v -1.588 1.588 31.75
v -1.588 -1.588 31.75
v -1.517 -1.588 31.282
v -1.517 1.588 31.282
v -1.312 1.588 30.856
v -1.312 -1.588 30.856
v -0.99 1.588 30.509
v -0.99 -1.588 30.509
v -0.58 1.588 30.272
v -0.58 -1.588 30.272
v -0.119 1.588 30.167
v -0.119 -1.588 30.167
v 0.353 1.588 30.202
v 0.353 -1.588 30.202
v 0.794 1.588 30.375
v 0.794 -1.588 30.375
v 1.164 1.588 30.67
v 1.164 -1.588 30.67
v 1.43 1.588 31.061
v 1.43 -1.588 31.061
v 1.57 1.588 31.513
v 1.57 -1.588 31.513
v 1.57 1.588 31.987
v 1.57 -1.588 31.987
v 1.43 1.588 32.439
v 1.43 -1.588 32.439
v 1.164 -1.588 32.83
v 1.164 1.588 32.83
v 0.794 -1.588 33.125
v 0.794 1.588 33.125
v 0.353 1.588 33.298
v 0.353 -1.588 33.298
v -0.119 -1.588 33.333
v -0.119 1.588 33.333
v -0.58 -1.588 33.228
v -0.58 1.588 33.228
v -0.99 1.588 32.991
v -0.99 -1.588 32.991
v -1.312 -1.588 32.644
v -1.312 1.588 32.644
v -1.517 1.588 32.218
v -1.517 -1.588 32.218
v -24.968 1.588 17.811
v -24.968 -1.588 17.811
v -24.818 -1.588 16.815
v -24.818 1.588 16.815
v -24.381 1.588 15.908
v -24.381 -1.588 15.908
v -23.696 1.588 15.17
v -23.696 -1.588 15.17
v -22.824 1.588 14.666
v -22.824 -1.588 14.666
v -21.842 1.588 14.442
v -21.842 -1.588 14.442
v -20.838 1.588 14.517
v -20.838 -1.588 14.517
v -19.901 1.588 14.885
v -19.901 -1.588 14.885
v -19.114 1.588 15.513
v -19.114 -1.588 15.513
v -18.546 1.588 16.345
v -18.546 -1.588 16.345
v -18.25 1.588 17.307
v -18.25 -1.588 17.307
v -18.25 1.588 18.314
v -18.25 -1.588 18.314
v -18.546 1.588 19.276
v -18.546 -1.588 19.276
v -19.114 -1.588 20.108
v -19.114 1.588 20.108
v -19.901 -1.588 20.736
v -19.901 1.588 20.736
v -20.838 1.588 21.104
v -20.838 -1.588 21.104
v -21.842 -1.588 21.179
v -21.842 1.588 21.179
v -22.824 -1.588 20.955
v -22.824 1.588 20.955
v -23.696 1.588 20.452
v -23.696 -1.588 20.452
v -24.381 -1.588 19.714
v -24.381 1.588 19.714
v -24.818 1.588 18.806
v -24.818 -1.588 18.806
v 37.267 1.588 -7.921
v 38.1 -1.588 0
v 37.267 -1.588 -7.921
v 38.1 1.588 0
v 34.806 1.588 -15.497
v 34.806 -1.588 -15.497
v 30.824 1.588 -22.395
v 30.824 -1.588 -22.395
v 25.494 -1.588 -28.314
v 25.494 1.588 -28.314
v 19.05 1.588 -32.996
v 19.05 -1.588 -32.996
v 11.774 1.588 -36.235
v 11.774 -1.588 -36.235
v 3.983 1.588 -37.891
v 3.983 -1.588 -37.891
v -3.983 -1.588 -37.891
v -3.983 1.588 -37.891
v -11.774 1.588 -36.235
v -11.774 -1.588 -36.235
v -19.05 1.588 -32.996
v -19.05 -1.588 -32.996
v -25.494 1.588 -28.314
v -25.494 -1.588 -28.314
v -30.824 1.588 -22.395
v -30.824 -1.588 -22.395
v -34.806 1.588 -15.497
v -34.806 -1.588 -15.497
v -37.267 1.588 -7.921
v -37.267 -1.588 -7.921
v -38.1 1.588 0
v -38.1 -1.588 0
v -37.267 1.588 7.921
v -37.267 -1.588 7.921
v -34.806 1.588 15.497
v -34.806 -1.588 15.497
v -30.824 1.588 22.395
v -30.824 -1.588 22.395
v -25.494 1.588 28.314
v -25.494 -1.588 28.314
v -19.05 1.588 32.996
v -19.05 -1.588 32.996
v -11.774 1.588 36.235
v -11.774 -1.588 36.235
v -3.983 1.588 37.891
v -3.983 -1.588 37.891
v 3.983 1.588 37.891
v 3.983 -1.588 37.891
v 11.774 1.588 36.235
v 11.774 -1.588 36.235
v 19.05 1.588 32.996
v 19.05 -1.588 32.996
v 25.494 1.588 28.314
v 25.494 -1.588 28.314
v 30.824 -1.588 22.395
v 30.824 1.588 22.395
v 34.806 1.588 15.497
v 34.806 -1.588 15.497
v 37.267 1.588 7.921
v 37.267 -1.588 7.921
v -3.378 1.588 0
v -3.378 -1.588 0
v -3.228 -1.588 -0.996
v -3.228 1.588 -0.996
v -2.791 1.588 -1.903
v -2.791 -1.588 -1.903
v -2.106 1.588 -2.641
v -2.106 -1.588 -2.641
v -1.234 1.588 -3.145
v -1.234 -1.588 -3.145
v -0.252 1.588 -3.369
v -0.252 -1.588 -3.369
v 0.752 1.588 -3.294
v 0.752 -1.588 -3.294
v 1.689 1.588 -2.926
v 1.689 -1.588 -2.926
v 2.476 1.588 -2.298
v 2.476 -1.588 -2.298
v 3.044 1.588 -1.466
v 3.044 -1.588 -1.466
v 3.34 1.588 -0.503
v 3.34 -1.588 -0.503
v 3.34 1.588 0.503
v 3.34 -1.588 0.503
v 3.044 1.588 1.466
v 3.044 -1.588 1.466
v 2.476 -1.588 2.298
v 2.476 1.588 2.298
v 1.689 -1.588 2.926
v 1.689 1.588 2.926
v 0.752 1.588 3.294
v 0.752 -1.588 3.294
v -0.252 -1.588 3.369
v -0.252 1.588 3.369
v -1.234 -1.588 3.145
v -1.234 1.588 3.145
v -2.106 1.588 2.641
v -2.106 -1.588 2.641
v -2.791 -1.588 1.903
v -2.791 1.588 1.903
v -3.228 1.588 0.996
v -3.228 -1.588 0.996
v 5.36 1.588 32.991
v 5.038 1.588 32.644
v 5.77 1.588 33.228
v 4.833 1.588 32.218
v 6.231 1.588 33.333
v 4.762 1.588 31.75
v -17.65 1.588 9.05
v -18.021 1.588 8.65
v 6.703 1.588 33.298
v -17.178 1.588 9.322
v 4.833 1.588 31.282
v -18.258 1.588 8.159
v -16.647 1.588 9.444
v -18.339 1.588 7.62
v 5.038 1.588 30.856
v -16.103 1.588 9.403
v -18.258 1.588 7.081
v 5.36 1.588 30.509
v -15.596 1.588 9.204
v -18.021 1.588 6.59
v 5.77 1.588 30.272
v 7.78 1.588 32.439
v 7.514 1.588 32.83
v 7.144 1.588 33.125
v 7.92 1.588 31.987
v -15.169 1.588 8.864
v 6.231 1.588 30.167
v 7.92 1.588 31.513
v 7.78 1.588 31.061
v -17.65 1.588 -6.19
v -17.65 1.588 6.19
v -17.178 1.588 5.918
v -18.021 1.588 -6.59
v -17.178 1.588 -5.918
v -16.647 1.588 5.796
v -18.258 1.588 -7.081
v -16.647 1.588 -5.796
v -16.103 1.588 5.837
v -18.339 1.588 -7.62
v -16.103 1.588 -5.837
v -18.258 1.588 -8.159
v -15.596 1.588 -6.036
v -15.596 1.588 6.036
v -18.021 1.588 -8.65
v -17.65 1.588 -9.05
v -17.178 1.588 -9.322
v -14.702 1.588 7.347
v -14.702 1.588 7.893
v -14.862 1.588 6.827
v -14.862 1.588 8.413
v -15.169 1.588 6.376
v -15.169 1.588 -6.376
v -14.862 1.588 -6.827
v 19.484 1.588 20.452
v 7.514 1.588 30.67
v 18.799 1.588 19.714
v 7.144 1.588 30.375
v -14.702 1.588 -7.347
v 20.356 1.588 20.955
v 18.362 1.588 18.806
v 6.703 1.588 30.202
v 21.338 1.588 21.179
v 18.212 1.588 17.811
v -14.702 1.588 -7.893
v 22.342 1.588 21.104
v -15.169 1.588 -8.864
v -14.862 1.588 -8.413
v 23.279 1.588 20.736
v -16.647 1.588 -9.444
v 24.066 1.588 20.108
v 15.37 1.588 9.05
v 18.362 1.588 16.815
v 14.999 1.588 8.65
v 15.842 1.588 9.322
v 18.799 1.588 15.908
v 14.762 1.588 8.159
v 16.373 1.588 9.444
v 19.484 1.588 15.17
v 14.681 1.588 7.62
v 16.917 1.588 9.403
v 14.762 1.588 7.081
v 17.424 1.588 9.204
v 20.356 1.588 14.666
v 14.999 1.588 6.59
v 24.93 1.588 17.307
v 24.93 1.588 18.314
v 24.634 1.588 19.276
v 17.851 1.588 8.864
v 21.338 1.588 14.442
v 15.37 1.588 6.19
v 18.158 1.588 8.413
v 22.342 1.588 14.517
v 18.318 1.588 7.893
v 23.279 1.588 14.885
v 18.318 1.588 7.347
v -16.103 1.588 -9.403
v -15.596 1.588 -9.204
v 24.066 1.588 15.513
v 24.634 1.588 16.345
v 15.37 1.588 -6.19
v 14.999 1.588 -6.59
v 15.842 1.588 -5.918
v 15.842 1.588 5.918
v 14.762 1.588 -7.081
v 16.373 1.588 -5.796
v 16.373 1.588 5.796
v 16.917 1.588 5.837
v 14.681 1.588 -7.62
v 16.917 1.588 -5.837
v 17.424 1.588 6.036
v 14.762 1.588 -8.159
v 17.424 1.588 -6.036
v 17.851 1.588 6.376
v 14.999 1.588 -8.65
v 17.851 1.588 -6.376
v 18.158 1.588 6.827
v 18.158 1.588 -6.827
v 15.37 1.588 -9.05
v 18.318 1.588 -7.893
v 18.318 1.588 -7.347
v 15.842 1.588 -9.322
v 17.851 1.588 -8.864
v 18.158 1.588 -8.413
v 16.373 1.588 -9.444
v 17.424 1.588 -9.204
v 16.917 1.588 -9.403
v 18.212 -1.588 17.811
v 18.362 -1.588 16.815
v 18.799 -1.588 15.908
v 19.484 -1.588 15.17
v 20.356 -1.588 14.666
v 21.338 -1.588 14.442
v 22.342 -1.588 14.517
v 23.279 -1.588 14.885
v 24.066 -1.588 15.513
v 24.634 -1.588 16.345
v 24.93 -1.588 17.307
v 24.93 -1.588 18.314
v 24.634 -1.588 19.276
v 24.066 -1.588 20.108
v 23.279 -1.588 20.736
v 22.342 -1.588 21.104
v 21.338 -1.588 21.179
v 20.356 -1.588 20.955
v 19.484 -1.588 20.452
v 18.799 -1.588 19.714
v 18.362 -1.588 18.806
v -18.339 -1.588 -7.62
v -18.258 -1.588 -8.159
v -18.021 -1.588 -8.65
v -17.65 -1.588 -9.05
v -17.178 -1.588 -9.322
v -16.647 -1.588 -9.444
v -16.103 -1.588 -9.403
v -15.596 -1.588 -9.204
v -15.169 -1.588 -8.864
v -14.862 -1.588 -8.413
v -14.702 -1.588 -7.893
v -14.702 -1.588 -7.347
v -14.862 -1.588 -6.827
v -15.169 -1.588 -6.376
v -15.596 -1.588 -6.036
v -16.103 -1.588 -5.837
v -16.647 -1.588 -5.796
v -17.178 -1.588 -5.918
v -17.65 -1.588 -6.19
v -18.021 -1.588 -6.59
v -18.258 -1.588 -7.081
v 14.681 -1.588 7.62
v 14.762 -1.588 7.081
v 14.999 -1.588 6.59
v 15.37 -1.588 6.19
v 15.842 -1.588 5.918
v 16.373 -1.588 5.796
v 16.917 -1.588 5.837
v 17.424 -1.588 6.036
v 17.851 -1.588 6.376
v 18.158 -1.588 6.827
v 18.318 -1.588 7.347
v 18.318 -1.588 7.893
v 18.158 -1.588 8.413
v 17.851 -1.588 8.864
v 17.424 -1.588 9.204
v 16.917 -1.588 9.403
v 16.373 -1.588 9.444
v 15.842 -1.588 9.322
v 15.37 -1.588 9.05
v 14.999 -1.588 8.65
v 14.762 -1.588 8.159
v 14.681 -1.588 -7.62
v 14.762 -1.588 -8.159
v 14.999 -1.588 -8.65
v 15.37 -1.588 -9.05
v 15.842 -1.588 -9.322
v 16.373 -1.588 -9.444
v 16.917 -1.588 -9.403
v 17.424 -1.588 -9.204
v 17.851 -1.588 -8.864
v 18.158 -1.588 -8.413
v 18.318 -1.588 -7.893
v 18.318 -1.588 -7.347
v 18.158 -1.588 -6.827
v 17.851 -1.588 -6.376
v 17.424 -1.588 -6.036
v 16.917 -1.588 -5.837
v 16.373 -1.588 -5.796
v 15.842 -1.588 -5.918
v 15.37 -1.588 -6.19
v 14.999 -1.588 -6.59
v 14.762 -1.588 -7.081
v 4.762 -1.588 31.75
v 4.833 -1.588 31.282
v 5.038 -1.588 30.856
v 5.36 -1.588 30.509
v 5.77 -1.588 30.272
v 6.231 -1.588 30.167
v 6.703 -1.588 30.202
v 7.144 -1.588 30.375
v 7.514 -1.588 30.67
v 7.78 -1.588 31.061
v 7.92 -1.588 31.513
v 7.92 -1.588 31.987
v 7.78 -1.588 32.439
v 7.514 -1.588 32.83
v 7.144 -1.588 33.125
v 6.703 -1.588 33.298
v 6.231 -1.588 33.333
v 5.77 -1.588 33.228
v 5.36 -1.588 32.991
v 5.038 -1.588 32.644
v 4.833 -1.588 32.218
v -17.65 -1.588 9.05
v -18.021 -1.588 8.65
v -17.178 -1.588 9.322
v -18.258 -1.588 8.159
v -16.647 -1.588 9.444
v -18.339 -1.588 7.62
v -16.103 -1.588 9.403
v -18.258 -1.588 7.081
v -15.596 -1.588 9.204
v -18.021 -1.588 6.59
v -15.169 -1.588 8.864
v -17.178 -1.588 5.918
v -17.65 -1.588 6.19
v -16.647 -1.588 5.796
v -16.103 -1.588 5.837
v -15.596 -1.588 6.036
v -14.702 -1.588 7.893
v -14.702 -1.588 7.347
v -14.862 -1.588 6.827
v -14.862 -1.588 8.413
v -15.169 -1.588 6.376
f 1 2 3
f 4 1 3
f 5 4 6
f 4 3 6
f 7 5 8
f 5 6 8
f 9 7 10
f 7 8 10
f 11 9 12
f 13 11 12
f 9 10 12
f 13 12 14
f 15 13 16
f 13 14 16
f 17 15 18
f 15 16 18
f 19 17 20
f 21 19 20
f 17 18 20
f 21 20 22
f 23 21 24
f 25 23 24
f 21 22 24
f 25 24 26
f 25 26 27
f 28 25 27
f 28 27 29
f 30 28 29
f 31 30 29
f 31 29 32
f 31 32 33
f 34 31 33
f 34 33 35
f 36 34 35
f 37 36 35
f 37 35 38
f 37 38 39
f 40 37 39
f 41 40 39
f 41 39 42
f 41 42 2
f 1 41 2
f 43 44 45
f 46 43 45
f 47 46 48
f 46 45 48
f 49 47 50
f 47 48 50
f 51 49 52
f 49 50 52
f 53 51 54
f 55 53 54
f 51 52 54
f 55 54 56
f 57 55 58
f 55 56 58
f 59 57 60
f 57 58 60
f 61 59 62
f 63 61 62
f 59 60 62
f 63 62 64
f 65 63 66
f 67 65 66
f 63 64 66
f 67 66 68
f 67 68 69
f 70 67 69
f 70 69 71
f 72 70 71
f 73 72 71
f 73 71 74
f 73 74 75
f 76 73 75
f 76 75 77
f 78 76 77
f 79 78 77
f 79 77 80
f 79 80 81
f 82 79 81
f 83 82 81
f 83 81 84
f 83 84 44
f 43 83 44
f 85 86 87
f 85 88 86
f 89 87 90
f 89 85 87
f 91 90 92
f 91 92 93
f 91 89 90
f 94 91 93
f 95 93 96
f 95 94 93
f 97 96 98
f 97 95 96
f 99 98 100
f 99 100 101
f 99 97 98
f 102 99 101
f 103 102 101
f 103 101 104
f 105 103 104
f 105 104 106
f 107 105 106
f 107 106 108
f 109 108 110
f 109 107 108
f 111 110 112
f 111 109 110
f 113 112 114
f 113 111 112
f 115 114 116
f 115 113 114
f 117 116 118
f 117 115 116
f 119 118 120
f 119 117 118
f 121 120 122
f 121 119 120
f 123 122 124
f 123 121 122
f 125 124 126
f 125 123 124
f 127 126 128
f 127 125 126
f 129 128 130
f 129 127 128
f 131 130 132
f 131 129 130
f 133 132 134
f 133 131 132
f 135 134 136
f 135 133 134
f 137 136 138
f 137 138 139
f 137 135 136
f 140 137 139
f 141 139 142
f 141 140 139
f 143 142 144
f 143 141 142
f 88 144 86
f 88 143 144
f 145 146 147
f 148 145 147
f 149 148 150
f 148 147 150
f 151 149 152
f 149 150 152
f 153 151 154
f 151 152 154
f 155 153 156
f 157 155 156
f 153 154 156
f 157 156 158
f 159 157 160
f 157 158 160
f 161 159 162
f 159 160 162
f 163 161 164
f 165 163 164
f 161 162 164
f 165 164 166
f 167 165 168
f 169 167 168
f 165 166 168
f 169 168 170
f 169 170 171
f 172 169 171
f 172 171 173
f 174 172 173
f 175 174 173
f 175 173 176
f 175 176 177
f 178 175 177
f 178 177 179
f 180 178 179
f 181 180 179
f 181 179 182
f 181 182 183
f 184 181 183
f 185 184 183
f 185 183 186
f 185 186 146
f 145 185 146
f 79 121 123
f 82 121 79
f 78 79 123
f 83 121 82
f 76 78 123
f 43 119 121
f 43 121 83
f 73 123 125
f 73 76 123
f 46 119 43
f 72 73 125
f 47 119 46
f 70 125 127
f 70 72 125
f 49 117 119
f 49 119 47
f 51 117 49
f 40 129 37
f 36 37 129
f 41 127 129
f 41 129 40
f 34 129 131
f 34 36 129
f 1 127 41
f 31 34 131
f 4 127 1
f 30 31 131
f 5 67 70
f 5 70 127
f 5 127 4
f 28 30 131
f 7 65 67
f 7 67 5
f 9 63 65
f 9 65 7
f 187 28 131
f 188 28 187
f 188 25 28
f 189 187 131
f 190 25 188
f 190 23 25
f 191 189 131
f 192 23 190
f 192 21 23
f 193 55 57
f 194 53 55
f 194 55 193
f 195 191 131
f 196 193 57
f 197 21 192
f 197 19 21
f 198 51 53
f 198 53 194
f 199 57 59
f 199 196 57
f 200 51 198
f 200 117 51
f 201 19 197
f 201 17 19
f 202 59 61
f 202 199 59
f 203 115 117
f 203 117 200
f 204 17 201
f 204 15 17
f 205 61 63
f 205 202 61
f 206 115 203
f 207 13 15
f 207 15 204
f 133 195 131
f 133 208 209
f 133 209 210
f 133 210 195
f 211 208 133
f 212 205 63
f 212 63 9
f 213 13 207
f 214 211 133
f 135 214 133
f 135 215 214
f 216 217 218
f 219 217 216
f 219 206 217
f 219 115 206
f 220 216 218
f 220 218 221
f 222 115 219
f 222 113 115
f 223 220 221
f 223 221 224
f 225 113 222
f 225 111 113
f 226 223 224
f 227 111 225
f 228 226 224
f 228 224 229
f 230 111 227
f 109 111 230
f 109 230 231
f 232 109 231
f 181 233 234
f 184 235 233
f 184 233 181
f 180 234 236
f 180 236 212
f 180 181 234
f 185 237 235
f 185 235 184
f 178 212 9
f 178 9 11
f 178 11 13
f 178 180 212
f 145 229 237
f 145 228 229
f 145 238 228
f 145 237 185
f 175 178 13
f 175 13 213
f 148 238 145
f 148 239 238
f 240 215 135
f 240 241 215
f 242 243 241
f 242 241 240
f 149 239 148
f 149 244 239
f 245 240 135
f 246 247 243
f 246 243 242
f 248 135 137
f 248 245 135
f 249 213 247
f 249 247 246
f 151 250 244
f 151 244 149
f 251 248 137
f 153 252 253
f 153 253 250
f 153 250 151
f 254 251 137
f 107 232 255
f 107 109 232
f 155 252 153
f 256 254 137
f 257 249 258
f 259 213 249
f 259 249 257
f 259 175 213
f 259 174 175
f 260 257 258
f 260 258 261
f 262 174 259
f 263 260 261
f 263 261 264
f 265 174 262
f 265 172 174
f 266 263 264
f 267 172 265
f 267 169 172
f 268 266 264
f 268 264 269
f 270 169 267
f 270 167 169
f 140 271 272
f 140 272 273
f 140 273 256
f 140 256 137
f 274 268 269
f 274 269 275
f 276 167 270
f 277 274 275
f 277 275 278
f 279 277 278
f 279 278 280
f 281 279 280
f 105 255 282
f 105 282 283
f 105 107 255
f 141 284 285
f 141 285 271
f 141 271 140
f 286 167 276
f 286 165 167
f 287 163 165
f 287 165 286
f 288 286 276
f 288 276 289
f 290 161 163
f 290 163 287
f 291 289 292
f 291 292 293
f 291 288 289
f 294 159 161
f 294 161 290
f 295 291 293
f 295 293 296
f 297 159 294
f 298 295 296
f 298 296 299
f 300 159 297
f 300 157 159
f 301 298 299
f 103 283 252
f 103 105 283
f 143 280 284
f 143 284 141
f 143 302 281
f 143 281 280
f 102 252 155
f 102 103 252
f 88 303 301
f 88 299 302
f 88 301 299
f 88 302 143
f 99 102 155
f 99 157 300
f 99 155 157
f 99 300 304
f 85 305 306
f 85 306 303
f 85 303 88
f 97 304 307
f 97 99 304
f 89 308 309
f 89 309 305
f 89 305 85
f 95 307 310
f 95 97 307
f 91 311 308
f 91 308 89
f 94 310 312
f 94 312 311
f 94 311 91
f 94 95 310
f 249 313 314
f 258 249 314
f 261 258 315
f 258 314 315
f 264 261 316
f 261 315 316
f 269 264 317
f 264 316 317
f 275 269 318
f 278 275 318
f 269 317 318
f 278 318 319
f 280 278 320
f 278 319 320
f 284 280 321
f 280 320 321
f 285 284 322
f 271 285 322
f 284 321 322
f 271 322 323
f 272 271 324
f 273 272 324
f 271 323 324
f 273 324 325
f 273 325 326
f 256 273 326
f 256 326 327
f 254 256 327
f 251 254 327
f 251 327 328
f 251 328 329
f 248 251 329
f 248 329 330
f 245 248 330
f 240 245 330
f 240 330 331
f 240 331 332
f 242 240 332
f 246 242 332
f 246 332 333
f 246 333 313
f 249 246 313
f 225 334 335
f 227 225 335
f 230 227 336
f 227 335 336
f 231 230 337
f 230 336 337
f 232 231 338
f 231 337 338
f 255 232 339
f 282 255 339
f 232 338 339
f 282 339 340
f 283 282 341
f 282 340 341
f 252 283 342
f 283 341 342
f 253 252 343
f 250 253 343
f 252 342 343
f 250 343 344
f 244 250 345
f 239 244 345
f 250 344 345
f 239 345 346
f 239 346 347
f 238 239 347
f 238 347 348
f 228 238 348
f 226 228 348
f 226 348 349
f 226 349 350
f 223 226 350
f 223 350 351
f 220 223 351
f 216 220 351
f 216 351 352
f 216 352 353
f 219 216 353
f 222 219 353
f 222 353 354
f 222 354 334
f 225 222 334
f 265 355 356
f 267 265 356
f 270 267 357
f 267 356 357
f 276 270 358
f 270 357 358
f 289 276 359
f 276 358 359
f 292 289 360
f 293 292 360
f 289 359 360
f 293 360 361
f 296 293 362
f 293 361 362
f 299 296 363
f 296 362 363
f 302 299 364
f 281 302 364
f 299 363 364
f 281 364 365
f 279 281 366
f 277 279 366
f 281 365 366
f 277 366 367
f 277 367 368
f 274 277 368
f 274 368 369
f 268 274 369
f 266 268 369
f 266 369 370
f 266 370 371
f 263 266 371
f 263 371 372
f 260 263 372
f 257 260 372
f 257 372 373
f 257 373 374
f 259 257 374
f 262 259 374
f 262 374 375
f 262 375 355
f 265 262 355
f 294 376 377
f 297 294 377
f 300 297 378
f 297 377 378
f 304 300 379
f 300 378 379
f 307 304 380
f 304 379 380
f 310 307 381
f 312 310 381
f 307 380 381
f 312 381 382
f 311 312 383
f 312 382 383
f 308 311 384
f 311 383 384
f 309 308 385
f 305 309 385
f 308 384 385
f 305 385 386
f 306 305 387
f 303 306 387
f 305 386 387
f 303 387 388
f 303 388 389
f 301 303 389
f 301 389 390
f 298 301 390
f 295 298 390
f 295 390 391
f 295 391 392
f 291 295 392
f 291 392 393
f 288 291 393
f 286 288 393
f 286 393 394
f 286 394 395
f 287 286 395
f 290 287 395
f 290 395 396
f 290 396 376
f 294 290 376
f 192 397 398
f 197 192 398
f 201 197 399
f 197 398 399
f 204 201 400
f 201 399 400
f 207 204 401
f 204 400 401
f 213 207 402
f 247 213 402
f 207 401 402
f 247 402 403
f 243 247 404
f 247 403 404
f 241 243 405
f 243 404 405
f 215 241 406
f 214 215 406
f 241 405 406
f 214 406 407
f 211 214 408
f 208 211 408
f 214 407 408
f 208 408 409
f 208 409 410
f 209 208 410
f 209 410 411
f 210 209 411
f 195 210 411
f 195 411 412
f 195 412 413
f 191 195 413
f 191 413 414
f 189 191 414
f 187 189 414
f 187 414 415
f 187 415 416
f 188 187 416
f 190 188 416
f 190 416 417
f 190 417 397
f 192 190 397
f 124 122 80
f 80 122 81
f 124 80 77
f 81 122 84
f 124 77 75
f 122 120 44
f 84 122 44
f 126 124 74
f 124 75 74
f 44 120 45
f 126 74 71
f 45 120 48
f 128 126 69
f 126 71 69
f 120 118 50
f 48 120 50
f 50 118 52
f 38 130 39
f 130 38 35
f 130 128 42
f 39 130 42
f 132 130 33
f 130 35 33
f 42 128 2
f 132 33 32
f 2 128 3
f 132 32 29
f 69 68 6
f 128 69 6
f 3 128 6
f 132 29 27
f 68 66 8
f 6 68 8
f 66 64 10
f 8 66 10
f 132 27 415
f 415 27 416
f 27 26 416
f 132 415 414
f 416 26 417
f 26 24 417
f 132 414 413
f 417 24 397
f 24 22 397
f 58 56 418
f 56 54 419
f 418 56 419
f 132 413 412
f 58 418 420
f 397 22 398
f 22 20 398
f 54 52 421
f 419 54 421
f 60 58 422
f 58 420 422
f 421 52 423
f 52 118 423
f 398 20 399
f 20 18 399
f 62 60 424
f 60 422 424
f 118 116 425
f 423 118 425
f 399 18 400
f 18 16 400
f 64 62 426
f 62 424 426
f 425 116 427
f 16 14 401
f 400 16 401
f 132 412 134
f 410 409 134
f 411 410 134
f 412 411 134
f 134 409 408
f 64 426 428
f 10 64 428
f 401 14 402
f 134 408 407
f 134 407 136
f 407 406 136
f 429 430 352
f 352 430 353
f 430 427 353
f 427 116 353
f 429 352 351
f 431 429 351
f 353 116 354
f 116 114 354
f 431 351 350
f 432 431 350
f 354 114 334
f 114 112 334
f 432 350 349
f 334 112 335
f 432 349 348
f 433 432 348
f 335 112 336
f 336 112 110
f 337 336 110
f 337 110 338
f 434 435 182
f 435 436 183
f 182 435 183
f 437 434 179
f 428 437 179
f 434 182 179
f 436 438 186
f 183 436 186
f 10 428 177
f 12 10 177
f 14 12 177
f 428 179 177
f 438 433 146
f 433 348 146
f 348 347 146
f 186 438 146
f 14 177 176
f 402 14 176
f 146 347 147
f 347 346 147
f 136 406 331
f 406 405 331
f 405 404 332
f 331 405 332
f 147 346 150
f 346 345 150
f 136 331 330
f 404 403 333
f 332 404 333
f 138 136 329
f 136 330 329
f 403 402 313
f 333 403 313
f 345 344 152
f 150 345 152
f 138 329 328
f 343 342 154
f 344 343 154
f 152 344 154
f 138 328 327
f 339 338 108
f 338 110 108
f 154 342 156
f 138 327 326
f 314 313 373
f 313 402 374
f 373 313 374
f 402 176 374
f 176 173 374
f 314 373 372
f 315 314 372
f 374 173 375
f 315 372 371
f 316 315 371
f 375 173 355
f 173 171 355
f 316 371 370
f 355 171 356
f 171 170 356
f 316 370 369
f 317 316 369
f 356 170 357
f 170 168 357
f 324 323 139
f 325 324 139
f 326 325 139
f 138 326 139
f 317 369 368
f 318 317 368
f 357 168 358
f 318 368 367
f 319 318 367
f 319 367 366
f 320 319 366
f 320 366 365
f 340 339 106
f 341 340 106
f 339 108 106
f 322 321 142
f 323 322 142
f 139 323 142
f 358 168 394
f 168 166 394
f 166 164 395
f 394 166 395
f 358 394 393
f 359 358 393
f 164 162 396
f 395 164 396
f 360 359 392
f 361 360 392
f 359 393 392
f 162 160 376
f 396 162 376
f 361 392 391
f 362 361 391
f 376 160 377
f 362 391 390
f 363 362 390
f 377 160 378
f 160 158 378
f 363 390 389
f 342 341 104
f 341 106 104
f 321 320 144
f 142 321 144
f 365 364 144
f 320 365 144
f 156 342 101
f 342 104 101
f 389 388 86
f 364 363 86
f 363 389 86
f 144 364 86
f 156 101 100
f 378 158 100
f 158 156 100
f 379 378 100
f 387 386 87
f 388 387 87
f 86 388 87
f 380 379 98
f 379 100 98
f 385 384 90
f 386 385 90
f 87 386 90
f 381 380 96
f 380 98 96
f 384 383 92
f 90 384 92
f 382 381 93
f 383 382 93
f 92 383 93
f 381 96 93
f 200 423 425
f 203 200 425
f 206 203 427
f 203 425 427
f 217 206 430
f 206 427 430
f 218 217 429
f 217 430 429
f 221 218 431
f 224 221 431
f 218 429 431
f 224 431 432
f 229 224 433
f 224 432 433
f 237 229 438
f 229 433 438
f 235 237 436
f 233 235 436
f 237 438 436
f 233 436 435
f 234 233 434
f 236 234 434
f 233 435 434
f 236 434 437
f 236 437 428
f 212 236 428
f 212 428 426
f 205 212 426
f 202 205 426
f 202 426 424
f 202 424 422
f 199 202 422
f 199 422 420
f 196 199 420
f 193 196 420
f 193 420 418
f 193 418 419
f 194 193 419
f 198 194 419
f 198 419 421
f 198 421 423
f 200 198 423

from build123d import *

# Parameters (mm, degrees)
SKETCH1_R                    = 38.1
BOSS_EXTRUDE1_DEPTH          = 1.5875
F_1_4_CLEARANCE_HOLE1_D      = 6.7564
F_1_4_CLEARANCE_HOLE2_D      = 6.7564
F_1_8_0_125_DIAMETER_HOLE1_D = 3.175
F_27_0_144_DIAMETER_HOLE1_D  = 3.6576


with BuildPart() as part:
    # Sketch1 → Boss-Extrude1 (new body, symmetric)
    with BuildSketch(Plane(origin=(0, 0, 0), x_dir=(1, 0, 0), z_dir=(0, 1, 0))):
        Circle(SKETCH1_R)
    extrude(amount=BOSS_EXTRUDE1_DEPTH, both=True)

    # 1/4 Clearance Hole1 (through all)
    with Locations(Plane(origin=(0, 1.5875, 0), x_dir=(1, 0, 0), z_dir=(0, 1, 0))):
        with Locations((-21.59, -17.810706314), (21.59, -17.810706314)):
            Hole(F_1_4_CLEARANCE_HOLE1_D / 2)

    # 1/4 Clearance Hole2 (through all)
    with Locations(Plane(origin=(0, 1.5875, 0), x_dir=(1, 0, 0), z_dir=(0, 1, 0))):
        with Locations((0, 0)):
            Hole(F_1_4_CLEARANCE_HOLE2_D / 2)

    # 1/8 (0.125) Diameter Hole1 (through all)
    with Locations(Plane(origin=(0, 1.5875, 0), x_dir=(1, 0, 0), z_dir=(0, 1, 0))):
        with Locations((0, -31.75), (6.35, -31.75)):
            Hole(F_1_8_0_125_DIAMETER_HOLE1_D / 2)

    # #27 (0.144) Diameter Hole1 (through all)
    with Locations(Plane(origin=(0, 1.5875, 0), x_dir=(1, 0, 0), z_dir=(0, 1, 0))):
        with Locations((-16.51, 7.62), (16.51, 7.62), (16.51, -7.62), (-16.51, -7.62)):
            Hole(F_27_0_144_DIAMETER_HOLE1_D / 2)


solid = part.part
